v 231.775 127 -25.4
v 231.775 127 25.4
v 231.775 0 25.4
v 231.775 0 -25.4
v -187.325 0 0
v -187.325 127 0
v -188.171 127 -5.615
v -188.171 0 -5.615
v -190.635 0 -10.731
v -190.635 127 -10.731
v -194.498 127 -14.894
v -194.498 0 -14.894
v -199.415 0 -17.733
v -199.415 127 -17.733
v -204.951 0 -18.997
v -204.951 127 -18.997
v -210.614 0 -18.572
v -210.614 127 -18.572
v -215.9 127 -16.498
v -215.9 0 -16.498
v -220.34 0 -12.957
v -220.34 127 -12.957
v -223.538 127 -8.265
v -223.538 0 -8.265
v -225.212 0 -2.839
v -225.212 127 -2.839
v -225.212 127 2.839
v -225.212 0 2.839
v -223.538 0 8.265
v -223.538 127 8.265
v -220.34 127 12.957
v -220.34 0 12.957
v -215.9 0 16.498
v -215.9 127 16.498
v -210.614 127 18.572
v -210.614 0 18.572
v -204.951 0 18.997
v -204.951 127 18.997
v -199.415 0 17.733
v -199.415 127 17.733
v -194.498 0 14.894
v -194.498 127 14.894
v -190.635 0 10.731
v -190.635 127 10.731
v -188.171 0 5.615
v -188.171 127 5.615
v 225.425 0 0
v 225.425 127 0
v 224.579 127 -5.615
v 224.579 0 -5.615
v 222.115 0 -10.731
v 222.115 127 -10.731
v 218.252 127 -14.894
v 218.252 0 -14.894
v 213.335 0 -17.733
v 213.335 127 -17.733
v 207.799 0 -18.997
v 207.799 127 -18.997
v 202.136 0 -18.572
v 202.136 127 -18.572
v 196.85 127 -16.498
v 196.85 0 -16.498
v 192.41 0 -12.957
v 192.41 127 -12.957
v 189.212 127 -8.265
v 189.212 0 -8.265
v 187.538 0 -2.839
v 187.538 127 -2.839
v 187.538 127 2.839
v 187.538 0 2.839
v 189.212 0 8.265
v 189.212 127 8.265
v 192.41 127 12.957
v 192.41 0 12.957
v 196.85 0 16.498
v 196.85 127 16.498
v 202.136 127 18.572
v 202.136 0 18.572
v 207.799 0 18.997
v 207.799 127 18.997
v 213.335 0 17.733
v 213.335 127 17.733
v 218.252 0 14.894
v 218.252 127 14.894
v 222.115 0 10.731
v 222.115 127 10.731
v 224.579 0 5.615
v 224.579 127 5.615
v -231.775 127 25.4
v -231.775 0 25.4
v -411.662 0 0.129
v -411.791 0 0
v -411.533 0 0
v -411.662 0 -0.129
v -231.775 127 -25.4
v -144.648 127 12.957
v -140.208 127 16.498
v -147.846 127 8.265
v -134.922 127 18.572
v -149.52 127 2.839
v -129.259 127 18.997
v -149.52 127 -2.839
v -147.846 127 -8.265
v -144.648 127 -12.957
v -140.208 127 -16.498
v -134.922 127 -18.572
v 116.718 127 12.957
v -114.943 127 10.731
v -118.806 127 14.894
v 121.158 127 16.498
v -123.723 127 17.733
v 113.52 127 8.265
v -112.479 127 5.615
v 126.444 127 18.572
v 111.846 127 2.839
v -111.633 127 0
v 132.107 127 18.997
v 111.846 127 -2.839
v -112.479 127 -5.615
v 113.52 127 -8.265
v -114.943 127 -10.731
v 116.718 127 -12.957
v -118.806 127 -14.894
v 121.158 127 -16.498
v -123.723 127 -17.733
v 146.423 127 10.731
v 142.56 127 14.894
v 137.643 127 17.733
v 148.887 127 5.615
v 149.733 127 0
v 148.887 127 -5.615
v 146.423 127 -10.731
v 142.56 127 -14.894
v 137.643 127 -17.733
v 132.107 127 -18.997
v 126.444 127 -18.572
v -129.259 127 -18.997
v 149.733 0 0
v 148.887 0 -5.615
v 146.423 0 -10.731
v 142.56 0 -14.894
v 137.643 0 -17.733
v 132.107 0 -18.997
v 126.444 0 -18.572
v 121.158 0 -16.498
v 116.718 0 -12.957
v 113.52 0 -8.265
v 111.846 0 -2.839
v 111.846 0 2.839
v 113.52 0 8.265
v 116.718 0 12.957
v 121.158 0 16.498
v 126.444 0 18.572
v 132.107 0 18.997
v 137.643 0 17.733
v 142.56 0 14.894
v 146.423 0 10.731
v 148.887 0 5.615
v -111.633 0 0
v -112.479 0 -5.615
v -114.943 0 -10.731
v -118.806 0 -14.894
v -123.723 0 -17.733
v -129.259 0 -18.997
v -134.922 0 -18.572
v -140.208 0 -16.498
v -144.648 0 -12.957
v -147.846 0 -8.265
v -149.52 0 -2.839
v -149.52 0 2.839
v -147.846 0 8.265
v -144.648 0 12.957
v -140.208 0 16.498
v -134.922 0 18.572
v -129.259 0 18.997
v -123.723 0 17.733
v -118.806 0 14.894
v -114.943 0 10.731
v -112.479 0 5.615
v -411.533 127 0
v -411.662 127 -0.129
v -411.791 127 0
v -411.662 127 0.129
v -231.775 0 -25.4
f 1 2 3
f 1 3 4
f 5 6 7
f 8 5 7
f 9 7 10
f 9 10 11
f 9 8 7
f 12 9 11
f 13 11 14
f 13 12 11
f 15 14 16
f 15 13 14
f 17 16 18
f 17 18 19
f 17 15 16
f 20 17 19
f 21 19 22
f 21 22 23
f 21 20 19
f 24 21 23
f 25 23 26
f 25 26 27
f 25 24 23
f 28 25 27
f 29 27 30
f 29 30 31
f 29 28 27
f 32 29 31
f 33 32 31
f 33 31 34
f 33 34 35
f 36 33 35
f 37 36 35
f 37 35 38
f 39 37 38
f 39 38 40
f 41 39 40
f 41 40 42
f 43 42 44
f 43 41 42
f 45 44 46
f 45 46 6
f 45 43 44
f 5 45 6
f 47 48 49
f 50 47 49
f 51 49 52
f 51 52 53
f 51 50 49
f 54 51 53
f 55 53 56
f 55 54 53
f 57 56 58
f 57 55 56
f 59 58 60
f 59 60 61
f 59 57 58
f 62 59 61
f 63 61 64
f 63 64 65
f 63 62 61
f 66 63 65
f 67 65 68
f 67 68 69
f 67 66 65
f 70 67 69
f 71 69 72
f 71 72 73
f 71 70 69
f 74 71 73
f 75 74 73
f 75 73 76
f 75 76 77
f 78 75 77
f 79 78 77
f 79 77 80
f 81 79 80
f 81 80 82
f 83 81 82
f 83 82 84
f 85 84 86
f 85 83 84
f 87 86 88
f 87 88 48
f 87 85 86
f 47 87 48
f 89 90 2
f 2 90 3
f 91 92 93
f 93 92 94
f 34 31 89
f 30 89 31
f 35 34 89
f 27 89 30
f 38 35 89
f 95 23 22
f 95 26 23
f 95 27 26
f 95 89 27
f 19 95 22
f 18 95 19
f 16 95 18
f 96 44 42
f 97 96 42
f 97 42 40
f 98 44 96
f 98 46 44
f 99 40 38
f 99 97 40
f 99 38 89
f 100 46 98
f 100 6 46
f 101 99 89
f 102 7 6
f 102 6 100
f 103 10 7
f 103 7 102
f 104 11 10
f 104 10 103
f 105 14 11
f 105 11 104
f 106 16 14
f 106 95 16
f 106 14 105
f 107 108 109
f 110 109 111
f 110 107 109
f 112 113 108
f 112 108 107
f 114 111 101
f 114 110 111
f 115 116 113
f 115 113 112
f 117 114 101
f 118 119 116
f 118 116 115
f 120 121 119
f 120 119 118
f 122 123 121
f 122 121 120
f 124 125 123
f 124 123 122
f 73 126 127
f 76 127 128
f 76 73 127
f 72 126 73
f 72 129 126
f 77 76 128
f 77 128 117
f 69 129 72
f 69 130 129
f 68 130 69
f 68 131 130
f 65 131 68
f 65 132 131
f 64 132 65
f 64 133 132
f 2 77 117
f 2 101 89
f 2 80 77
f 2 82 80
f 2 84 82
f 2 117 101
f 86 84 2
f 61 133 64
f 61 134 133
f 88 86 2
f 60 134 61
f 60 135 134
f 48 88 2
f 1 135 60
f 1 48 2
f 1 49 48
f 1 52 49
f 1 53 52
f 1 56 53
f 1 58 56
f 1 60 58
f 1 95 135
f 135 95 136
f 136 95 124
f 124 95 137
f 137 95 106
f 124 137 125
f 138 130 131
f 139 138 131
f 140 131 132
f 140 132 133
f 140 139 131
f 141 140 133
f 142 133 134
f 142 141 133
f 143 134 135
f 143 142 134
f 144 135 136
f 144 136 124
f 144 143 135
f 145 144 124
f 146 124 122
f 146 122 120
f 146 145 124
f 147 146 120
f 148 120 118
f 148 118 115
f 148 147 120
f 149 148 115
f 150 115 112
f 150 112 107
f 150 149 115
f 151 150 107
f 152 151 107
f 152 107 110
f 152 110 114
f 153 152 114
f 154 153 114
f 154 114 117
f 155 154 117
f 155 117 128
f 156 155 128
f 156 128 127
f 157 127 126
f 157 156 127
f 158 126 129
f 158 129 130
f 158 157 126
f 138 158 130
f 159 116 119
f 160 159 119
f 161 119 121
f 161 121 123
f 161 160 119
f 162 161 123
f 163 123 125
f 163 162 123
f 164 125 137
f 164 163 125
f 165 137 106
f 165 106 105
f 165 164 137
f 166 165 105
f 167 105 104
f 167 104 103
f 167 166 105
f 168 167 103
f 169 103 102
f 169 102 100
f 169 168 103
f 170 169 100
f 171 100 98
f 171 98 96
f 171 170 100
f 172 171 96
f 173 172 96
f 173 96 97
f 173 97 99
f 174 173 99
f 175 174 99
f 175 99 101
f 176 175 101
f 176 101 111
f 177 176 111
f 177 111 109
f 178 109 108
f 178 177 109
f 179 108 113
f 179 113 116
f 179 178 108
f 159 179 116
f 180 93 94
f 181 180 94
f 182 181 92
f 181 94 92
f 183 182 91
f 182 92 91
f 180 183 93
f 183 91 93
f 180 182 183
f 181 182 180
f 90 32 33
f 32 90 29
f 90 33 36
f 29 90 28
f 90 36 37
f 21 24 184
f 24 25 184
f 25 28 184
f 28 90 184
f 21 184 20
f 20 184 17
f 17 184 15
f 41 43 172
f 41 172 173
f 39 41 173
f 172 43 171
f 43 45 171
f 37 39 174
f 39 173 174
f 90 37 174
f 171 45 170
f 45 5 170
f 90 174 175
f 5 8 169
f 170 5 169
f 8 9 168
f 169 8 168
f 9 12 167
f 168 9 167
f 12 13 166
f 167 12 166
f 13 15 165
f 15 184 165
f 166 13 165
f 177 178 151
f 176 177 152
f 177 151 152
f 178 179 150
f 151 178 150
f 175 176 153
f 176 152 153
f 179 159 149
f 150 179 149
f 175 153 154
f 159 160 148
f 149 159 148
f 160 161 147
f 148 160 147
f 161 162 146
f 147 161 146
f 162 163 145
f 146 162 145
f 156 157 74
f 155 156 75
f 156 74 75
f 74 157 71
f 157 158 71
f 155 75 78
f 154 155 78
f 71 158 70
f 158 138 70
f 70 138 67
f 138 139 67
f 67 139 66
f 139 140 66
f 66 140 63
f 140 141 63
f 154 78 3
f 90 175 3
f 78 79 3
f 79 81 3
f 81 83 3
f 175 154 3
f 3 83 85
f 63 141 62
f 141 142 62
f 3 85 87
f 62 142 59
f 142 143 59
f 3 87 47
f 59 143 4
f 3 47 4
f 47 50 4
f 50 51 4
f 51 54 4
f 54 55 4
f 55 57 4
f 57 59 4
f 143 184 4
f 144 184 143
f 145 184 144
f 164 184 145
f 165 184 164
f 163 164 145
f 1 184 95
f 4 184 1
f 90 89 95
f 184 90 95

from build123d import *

# Parameters (mm, degrees)
SKETCH1_R             = 0.129035646
BOSS_EXTRUDE1_DEPTH   = 127
SKETCH1_W             = 463.55
SKETCH1_H             = 50.8
SKETCH1_R_2           = 19.05
BOSS_EXTRUDE1_2_DEPTH = 127


with BuildPart() as part:
    # Sketch1 → Boss-Extrude1 (new body)
    with BuildSketch(Plane(origin=(0, 0, 0), x_dir=(1, 0, 0), z_dir=(0, 1, 0))):
        with Locations((-411.662010213, 0)):
            Circle(SKETCH1_R)
    extrude(amount=BOSS_EXTRUDE1_DEPTH)


with BuildPart() as body_2:
    # Sketch1 → Boss-Extrude1 2 (new body)
    with BuildSketch(Plane(origin=(0, 0, 0), x_dir=(1, 0, 0), z_dir=(0, 1, 0))):
        Rectangle(SKETCH1_W, SKETCH1_H)
        with Locations((206.375, 0)):
            Circle(SKETCH1_R_2, mode=Mode.SUBTRACT)
        with Locations((-206.375, 0)):
            Circle(SKETCH1_R_2, mode=Mode.SUBTRACT)
        with Locations((130.683, 0)):
            Circle(SKETCH1_R_2, mode=Mode.SUBTRACT)
        with Locations((-130.683, 0)):
            Circle(SKETCH1_R_2, mode=Mode.SUBTRACT)
    extrude(amount=BOSS_EXTRUDE1_2_DEPTH)


solid = Compound([part.part, body_2.part])
